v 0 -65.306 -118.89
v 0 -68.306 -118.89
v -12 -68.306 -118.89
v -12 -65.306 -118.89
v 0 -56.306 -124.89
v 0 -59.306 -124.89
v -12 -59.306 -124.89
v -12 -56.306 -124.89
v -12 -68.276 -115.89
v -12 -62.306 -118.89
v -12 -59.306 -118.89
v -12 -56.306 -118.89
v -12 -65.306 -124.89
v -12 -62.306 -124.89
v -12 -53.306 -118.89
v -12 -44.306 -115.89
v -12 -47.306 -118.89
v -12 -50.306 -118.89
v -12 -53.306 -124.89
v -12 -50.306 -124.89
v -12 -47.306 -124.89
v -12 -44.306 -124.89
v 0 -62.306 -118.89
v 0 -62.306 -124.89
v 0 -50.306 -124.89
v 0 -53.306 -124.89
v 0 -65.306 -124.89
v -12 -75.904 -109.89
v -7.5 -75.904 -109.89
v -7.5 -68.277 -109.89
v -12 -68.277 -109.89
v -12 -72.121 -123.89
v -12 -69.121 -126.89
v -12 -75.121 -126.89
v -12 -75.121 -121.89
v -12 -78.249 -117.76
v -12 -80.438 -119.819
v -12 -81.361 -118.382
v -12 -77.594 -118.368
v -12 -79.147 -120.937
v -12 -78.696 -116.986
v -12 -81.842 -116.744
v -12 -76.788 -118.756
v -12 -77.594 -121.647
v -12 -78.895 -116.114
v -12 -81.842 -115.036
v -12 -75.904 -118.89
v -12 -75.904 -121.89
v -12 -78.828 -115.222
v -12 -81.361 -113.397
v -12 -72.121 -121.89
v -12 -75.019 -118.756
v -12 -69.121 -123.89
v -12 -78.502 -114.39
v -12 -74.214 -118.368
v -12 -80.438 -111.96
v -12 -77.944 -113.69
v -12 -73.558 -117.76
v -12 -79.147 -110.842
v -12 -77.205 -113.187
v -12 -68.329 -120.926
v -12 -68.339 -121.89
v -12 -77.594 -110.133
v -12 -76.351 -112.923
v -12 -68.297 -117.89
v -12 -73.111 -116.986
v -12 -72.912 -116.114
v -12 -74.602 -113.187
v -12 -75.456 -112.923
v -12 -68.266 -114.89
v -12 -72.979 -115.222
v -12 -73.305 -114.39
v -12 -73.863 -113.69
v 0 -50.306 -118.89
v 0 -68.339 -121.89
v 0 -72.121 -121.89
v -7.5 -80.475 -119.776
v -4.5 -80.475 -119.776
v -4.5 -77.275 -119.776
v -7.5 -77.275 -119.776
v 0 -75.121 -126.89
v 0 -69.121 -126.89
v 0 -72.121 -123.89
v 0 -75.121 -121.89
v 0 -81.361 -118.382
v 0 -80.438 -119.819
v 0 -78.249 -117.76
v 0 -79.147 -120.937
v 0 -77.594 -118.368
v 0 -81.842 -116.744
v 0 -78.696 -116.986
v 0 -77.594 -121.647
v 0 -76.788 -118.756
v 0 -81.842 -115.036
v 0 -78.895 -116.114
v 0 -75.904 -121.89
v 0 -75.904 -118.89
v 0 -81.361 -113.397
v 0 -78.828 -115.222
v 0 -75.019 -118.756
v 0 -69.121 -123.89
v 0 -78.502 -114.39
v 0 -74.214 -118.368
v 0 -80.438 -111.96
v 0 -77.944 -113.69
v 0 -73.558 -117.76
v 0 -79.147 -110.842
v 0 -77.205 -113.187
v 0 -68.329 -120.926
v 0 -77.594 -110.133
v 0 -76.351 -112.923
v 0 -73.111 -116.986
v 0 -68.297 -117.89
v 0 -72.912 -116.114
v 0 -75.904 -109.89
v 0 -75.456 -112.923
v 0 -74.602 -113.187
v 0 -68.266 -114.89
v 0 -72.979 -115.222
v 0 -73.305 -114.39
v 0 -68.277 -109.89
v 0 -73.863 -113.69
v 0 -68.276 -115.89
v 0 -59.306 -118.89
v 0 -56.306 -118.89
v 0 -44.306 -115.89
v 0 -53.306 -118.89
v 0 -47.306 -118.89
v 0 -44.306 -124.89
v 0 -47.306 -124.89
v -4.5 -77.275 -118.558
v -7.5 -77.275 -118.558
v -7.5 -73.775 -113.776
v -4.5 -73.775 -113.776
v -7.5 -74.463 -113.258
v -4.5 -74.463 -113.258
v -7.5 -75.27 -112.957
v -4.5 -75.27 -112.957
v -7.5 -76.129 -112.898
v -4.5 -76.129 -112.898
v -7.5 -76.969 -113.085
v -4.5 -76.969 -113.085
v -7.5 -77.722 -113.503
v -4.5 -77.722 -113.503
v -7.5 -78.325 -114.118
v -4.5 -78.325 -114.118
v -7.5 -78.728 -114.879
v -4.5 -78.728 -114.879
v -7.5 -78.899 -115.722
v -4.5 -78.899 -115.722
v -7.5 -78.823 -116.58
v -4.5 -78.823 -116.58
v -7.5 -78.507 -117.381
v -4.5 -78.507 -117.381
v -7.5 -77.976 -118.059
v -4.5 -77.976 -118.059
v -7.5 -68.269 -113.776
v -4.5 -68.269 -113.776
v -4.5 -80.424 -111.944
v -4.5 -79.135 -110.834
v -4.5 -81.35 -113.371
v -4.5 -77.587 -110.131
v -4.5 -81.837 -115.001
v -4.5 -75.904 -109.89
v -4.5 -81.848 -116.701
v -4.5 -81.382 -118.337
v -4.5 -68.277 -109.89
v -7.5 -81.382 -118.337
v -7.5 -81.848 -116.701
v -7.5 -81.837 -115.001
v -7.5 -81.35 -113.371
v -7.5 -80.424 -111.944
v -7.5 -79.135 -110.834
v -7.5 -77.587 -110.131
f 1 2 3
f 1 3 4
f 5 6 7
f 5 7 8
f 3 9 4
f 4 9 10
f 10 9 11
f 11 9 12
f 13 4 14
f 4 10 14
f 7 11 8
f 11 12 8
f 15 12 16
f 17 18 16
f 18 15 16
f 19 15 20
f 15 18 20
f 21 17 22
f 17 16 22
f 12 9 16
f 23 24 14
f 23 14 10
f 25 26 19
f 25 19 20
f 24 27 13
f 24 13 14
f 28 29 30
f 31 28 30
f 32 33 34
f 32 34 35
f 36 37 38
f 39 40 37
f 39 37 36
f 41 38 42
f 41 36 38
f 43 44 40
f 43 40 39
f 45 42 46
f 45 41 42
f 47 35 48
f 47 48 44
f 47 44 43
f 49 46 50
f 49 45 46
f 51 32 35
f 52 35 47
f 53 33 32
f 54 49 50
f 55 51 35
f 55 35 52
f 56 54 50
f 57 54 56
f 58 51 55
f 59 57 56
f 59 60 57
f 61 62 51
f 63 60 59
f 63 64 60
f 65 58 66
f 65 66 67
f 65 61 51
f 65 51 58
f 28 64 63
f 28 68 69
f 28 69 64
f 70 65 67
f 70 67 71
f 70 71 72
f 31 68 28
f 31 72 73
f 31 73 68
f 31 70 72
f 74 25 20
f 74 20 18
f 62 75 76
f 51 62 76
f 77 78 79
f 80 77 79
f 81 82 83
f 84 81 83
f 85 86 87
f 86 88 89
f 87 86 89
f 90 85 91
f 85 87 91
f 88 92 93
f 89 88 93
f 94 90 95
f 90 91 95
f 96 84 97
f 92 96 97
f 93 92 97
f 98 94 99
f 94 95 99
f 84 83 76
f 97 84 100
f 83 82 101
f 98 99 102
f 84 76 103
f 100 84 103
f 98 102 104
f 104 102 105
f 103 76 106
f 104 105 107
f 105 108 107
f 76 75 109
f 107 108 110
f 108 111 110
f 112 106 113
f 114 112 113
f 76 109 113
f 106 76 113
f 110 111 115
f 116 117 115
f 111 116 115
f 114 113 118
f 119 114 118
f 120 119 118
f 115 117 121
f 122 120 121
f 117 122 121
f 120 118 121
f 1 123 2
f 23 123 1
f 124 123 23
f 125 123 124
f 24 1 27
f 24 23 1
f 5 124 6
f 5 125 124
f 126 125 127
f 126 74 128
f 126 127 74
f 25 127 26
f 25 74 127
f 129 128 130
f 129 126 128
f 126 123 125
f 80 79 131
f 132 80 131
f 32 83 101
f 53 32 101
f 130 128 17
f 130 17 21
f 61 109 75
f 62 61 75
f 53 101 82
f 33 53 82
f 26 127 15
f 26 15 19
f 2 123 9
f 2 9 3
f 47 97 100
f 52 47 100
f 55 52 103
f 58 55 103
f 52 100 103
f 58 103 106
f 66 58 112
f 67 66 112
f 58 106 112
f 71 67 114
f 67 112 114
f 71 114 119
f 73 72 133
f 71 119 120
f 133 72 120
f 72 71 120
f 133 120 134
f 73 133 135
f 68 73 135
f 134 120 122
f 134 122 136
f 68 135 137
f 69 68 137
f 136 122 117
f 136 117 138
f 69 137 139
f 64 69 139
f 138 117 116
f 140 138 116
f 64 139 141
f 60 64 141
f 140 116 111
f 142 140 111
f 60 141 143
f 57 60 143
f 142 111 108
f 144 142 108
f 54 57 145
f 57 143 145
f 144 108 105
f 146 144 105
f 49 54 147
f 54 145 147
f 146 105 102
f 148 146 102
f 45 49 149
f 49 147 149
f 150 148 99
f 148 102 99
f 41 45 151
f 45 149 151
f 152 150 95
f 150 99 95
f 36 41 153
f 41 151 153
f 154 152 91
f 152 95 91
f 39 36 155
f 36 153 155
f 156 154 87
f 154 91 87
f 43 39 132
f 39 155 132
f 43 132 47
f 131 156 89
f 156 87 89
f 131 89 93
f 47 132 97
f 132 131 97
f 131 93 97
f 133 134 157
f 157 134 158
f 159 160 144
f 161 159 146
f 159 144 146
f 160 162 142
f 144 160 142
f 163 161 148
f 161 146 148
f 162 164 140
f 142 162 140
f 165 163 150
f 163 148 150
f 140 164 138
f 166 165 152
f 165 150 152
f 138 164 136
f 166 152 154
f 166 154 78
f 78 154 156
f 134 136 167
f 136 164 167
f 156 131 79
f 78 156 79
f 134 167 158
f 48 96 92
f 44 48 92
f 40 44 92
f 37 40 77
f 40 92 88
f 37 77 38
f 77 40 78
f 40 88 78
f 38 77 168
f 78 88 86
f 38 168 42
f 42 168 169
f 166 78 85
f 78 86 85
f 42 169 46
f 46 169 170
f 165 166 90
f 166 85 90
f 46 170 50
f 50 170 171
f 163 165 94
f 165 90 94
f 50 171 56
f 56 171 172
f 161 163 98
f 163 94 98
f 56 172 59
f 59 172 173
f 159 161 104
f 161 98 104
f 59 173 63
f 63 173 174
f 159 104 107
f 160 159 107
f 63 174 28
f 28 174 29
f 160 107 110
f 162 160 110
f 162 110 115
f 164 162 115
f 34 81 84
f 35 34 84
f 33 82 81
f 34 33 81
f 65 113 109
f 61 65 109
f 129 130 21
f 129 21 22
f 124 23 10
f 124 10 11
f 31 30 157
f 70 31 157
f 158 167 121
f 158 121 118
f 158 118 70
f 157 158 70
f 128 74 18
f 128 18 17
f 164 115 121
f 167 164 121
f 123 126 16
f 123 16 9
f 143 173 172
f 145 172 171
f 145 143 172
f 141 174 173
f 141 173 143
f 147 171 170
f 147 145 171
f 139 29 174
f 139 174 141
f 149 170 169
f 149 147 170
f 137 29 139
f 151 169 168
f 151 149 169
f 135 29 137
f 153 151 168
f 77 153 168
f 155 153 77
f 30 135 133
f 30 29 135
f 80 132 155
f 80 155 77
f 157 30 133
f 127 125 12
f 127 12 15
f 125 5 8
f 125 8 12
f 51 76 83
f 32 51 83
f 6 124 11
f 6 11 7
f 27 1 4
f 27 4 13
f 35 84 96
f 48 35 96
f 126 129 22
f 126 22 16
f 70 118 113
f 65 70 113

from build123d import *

# Parameters (mm, degrees)
SKETCH4_R           = 3
BOSS_EXTRUDE2_DEPTH = 12
BOSS_EXTRUDE3_DEPTH = 12
CUT_EXTRUDE1_START  = -4.5
CUT_EXTRUDE1_DEPTH  = 3
BOSS_EXTRUDE4_DEPTH = 12


with BuildPart() as part:
    # Sketch4 → Boss-Extrude2 (new body)
    with BuildSketch(Plane(origin=(0, 0, 0), x_dir=(0, 0, -1), z_dir=(1, 0, 0))):
        with BuildLine():
            Line((114.889686184, -68.26593045), (117.889565828, -68.297153403))
            Line((117.889565828, -68.297153403), (120.925943631, -68.328756232))
            Line((120.925943631, -68.328756232), (121.889620656, -68.338786248))
            Line((121.889620656, -68.338786248), (121.889620656, -75.903550783))
            ThreePointArc((121.889620656, -75.903550783), (115.889620656, -81.903550783), (109.889620656, -75.903550783))
            Line((109.889620656, -75.903550783), (109.889620656, -68.277498728))
            Line((109.889620656, -68.277498728), (114.889686184, -68.26593045))
        make_face()
        with Locations((115.889620656, -75.903550783)):
            Circle(SKETCH4_R, mode=Mode.SUBTRACT)
    extrude(amount=-BOSS_EXTRUDE2_DEPTH)

    # Sketch3 → Cut-Extrude1 (cut)
    with BuildSketch(Plane(origin=(0, 0, 0), x_dir=(0, 0, -1), z_dir=(1, 0, 0)).offset(CUT_EXTRUDE1_START)):
        Polygon((108.275790375, -67.274508057), (108.275790375, -83.274508057), (119.775790375, -83.274508057), (119.775790375, -77.274508057), (113.775790375, -77.274508057), (113.775790375, -67.274508057), align=None)
    extrude(amount=-CUT_EXTRUDE1_DEPTH, mode=Mode.SUBTRACT)

    # Sketch7 → Boss-Extrude4 (add)
    with BuildSketch(Plane(origin=(0, 0, 0), x_dir=(0, 0, -1), z_dir=(1, 0, 0))):
        Polygon((121.889620656, -72.121168516), (123.889620656, -72.121168516), (123.889620656, -69.121168516), (126.889620656, -69.121168516), (126.889620656, -75.121168516), (121.889620656, -75.121168516), align=None)
    extrude(amount=-BOSS_EXTRUDE4_DEPTH)


with BuildPart() as body_2:
    # Sketch5 → Boss-Extrude3 (new body)
    with BuildSketch(Plane(origin=(0, 0, 0), x_dir=(0, 0, -1), z_dir=(1, 0, 0))):
        Polygon((115.889620656, -44.306404862), (115.889620656, -68.276337837), (118.889522363, -68.306404862), (118.889522363, -65.306404862), (124.889522363, -65.306404862), (124.889522363, -62.306404862), (118.889522363, -62.306404862), (118.889522363, -59.306404862), (124.889522363, -59.306404862), (124.889522363, -56.306404862), (118.889522363, -56.306404862), (118.889522363, -53.306404862), (124.889522363, -53.306404862), (124.889522363, -50.306404862), (118.889522363, -50.306404862), (118.889522363, -47.306404862), (124.889522363, -47.306404862), (124.889522363, -44.306404862), align=None)
    extrude(amount=-BOSS_EXTRUDE3_DEPTH)


solid = Compound([part.part, body_2.part])
